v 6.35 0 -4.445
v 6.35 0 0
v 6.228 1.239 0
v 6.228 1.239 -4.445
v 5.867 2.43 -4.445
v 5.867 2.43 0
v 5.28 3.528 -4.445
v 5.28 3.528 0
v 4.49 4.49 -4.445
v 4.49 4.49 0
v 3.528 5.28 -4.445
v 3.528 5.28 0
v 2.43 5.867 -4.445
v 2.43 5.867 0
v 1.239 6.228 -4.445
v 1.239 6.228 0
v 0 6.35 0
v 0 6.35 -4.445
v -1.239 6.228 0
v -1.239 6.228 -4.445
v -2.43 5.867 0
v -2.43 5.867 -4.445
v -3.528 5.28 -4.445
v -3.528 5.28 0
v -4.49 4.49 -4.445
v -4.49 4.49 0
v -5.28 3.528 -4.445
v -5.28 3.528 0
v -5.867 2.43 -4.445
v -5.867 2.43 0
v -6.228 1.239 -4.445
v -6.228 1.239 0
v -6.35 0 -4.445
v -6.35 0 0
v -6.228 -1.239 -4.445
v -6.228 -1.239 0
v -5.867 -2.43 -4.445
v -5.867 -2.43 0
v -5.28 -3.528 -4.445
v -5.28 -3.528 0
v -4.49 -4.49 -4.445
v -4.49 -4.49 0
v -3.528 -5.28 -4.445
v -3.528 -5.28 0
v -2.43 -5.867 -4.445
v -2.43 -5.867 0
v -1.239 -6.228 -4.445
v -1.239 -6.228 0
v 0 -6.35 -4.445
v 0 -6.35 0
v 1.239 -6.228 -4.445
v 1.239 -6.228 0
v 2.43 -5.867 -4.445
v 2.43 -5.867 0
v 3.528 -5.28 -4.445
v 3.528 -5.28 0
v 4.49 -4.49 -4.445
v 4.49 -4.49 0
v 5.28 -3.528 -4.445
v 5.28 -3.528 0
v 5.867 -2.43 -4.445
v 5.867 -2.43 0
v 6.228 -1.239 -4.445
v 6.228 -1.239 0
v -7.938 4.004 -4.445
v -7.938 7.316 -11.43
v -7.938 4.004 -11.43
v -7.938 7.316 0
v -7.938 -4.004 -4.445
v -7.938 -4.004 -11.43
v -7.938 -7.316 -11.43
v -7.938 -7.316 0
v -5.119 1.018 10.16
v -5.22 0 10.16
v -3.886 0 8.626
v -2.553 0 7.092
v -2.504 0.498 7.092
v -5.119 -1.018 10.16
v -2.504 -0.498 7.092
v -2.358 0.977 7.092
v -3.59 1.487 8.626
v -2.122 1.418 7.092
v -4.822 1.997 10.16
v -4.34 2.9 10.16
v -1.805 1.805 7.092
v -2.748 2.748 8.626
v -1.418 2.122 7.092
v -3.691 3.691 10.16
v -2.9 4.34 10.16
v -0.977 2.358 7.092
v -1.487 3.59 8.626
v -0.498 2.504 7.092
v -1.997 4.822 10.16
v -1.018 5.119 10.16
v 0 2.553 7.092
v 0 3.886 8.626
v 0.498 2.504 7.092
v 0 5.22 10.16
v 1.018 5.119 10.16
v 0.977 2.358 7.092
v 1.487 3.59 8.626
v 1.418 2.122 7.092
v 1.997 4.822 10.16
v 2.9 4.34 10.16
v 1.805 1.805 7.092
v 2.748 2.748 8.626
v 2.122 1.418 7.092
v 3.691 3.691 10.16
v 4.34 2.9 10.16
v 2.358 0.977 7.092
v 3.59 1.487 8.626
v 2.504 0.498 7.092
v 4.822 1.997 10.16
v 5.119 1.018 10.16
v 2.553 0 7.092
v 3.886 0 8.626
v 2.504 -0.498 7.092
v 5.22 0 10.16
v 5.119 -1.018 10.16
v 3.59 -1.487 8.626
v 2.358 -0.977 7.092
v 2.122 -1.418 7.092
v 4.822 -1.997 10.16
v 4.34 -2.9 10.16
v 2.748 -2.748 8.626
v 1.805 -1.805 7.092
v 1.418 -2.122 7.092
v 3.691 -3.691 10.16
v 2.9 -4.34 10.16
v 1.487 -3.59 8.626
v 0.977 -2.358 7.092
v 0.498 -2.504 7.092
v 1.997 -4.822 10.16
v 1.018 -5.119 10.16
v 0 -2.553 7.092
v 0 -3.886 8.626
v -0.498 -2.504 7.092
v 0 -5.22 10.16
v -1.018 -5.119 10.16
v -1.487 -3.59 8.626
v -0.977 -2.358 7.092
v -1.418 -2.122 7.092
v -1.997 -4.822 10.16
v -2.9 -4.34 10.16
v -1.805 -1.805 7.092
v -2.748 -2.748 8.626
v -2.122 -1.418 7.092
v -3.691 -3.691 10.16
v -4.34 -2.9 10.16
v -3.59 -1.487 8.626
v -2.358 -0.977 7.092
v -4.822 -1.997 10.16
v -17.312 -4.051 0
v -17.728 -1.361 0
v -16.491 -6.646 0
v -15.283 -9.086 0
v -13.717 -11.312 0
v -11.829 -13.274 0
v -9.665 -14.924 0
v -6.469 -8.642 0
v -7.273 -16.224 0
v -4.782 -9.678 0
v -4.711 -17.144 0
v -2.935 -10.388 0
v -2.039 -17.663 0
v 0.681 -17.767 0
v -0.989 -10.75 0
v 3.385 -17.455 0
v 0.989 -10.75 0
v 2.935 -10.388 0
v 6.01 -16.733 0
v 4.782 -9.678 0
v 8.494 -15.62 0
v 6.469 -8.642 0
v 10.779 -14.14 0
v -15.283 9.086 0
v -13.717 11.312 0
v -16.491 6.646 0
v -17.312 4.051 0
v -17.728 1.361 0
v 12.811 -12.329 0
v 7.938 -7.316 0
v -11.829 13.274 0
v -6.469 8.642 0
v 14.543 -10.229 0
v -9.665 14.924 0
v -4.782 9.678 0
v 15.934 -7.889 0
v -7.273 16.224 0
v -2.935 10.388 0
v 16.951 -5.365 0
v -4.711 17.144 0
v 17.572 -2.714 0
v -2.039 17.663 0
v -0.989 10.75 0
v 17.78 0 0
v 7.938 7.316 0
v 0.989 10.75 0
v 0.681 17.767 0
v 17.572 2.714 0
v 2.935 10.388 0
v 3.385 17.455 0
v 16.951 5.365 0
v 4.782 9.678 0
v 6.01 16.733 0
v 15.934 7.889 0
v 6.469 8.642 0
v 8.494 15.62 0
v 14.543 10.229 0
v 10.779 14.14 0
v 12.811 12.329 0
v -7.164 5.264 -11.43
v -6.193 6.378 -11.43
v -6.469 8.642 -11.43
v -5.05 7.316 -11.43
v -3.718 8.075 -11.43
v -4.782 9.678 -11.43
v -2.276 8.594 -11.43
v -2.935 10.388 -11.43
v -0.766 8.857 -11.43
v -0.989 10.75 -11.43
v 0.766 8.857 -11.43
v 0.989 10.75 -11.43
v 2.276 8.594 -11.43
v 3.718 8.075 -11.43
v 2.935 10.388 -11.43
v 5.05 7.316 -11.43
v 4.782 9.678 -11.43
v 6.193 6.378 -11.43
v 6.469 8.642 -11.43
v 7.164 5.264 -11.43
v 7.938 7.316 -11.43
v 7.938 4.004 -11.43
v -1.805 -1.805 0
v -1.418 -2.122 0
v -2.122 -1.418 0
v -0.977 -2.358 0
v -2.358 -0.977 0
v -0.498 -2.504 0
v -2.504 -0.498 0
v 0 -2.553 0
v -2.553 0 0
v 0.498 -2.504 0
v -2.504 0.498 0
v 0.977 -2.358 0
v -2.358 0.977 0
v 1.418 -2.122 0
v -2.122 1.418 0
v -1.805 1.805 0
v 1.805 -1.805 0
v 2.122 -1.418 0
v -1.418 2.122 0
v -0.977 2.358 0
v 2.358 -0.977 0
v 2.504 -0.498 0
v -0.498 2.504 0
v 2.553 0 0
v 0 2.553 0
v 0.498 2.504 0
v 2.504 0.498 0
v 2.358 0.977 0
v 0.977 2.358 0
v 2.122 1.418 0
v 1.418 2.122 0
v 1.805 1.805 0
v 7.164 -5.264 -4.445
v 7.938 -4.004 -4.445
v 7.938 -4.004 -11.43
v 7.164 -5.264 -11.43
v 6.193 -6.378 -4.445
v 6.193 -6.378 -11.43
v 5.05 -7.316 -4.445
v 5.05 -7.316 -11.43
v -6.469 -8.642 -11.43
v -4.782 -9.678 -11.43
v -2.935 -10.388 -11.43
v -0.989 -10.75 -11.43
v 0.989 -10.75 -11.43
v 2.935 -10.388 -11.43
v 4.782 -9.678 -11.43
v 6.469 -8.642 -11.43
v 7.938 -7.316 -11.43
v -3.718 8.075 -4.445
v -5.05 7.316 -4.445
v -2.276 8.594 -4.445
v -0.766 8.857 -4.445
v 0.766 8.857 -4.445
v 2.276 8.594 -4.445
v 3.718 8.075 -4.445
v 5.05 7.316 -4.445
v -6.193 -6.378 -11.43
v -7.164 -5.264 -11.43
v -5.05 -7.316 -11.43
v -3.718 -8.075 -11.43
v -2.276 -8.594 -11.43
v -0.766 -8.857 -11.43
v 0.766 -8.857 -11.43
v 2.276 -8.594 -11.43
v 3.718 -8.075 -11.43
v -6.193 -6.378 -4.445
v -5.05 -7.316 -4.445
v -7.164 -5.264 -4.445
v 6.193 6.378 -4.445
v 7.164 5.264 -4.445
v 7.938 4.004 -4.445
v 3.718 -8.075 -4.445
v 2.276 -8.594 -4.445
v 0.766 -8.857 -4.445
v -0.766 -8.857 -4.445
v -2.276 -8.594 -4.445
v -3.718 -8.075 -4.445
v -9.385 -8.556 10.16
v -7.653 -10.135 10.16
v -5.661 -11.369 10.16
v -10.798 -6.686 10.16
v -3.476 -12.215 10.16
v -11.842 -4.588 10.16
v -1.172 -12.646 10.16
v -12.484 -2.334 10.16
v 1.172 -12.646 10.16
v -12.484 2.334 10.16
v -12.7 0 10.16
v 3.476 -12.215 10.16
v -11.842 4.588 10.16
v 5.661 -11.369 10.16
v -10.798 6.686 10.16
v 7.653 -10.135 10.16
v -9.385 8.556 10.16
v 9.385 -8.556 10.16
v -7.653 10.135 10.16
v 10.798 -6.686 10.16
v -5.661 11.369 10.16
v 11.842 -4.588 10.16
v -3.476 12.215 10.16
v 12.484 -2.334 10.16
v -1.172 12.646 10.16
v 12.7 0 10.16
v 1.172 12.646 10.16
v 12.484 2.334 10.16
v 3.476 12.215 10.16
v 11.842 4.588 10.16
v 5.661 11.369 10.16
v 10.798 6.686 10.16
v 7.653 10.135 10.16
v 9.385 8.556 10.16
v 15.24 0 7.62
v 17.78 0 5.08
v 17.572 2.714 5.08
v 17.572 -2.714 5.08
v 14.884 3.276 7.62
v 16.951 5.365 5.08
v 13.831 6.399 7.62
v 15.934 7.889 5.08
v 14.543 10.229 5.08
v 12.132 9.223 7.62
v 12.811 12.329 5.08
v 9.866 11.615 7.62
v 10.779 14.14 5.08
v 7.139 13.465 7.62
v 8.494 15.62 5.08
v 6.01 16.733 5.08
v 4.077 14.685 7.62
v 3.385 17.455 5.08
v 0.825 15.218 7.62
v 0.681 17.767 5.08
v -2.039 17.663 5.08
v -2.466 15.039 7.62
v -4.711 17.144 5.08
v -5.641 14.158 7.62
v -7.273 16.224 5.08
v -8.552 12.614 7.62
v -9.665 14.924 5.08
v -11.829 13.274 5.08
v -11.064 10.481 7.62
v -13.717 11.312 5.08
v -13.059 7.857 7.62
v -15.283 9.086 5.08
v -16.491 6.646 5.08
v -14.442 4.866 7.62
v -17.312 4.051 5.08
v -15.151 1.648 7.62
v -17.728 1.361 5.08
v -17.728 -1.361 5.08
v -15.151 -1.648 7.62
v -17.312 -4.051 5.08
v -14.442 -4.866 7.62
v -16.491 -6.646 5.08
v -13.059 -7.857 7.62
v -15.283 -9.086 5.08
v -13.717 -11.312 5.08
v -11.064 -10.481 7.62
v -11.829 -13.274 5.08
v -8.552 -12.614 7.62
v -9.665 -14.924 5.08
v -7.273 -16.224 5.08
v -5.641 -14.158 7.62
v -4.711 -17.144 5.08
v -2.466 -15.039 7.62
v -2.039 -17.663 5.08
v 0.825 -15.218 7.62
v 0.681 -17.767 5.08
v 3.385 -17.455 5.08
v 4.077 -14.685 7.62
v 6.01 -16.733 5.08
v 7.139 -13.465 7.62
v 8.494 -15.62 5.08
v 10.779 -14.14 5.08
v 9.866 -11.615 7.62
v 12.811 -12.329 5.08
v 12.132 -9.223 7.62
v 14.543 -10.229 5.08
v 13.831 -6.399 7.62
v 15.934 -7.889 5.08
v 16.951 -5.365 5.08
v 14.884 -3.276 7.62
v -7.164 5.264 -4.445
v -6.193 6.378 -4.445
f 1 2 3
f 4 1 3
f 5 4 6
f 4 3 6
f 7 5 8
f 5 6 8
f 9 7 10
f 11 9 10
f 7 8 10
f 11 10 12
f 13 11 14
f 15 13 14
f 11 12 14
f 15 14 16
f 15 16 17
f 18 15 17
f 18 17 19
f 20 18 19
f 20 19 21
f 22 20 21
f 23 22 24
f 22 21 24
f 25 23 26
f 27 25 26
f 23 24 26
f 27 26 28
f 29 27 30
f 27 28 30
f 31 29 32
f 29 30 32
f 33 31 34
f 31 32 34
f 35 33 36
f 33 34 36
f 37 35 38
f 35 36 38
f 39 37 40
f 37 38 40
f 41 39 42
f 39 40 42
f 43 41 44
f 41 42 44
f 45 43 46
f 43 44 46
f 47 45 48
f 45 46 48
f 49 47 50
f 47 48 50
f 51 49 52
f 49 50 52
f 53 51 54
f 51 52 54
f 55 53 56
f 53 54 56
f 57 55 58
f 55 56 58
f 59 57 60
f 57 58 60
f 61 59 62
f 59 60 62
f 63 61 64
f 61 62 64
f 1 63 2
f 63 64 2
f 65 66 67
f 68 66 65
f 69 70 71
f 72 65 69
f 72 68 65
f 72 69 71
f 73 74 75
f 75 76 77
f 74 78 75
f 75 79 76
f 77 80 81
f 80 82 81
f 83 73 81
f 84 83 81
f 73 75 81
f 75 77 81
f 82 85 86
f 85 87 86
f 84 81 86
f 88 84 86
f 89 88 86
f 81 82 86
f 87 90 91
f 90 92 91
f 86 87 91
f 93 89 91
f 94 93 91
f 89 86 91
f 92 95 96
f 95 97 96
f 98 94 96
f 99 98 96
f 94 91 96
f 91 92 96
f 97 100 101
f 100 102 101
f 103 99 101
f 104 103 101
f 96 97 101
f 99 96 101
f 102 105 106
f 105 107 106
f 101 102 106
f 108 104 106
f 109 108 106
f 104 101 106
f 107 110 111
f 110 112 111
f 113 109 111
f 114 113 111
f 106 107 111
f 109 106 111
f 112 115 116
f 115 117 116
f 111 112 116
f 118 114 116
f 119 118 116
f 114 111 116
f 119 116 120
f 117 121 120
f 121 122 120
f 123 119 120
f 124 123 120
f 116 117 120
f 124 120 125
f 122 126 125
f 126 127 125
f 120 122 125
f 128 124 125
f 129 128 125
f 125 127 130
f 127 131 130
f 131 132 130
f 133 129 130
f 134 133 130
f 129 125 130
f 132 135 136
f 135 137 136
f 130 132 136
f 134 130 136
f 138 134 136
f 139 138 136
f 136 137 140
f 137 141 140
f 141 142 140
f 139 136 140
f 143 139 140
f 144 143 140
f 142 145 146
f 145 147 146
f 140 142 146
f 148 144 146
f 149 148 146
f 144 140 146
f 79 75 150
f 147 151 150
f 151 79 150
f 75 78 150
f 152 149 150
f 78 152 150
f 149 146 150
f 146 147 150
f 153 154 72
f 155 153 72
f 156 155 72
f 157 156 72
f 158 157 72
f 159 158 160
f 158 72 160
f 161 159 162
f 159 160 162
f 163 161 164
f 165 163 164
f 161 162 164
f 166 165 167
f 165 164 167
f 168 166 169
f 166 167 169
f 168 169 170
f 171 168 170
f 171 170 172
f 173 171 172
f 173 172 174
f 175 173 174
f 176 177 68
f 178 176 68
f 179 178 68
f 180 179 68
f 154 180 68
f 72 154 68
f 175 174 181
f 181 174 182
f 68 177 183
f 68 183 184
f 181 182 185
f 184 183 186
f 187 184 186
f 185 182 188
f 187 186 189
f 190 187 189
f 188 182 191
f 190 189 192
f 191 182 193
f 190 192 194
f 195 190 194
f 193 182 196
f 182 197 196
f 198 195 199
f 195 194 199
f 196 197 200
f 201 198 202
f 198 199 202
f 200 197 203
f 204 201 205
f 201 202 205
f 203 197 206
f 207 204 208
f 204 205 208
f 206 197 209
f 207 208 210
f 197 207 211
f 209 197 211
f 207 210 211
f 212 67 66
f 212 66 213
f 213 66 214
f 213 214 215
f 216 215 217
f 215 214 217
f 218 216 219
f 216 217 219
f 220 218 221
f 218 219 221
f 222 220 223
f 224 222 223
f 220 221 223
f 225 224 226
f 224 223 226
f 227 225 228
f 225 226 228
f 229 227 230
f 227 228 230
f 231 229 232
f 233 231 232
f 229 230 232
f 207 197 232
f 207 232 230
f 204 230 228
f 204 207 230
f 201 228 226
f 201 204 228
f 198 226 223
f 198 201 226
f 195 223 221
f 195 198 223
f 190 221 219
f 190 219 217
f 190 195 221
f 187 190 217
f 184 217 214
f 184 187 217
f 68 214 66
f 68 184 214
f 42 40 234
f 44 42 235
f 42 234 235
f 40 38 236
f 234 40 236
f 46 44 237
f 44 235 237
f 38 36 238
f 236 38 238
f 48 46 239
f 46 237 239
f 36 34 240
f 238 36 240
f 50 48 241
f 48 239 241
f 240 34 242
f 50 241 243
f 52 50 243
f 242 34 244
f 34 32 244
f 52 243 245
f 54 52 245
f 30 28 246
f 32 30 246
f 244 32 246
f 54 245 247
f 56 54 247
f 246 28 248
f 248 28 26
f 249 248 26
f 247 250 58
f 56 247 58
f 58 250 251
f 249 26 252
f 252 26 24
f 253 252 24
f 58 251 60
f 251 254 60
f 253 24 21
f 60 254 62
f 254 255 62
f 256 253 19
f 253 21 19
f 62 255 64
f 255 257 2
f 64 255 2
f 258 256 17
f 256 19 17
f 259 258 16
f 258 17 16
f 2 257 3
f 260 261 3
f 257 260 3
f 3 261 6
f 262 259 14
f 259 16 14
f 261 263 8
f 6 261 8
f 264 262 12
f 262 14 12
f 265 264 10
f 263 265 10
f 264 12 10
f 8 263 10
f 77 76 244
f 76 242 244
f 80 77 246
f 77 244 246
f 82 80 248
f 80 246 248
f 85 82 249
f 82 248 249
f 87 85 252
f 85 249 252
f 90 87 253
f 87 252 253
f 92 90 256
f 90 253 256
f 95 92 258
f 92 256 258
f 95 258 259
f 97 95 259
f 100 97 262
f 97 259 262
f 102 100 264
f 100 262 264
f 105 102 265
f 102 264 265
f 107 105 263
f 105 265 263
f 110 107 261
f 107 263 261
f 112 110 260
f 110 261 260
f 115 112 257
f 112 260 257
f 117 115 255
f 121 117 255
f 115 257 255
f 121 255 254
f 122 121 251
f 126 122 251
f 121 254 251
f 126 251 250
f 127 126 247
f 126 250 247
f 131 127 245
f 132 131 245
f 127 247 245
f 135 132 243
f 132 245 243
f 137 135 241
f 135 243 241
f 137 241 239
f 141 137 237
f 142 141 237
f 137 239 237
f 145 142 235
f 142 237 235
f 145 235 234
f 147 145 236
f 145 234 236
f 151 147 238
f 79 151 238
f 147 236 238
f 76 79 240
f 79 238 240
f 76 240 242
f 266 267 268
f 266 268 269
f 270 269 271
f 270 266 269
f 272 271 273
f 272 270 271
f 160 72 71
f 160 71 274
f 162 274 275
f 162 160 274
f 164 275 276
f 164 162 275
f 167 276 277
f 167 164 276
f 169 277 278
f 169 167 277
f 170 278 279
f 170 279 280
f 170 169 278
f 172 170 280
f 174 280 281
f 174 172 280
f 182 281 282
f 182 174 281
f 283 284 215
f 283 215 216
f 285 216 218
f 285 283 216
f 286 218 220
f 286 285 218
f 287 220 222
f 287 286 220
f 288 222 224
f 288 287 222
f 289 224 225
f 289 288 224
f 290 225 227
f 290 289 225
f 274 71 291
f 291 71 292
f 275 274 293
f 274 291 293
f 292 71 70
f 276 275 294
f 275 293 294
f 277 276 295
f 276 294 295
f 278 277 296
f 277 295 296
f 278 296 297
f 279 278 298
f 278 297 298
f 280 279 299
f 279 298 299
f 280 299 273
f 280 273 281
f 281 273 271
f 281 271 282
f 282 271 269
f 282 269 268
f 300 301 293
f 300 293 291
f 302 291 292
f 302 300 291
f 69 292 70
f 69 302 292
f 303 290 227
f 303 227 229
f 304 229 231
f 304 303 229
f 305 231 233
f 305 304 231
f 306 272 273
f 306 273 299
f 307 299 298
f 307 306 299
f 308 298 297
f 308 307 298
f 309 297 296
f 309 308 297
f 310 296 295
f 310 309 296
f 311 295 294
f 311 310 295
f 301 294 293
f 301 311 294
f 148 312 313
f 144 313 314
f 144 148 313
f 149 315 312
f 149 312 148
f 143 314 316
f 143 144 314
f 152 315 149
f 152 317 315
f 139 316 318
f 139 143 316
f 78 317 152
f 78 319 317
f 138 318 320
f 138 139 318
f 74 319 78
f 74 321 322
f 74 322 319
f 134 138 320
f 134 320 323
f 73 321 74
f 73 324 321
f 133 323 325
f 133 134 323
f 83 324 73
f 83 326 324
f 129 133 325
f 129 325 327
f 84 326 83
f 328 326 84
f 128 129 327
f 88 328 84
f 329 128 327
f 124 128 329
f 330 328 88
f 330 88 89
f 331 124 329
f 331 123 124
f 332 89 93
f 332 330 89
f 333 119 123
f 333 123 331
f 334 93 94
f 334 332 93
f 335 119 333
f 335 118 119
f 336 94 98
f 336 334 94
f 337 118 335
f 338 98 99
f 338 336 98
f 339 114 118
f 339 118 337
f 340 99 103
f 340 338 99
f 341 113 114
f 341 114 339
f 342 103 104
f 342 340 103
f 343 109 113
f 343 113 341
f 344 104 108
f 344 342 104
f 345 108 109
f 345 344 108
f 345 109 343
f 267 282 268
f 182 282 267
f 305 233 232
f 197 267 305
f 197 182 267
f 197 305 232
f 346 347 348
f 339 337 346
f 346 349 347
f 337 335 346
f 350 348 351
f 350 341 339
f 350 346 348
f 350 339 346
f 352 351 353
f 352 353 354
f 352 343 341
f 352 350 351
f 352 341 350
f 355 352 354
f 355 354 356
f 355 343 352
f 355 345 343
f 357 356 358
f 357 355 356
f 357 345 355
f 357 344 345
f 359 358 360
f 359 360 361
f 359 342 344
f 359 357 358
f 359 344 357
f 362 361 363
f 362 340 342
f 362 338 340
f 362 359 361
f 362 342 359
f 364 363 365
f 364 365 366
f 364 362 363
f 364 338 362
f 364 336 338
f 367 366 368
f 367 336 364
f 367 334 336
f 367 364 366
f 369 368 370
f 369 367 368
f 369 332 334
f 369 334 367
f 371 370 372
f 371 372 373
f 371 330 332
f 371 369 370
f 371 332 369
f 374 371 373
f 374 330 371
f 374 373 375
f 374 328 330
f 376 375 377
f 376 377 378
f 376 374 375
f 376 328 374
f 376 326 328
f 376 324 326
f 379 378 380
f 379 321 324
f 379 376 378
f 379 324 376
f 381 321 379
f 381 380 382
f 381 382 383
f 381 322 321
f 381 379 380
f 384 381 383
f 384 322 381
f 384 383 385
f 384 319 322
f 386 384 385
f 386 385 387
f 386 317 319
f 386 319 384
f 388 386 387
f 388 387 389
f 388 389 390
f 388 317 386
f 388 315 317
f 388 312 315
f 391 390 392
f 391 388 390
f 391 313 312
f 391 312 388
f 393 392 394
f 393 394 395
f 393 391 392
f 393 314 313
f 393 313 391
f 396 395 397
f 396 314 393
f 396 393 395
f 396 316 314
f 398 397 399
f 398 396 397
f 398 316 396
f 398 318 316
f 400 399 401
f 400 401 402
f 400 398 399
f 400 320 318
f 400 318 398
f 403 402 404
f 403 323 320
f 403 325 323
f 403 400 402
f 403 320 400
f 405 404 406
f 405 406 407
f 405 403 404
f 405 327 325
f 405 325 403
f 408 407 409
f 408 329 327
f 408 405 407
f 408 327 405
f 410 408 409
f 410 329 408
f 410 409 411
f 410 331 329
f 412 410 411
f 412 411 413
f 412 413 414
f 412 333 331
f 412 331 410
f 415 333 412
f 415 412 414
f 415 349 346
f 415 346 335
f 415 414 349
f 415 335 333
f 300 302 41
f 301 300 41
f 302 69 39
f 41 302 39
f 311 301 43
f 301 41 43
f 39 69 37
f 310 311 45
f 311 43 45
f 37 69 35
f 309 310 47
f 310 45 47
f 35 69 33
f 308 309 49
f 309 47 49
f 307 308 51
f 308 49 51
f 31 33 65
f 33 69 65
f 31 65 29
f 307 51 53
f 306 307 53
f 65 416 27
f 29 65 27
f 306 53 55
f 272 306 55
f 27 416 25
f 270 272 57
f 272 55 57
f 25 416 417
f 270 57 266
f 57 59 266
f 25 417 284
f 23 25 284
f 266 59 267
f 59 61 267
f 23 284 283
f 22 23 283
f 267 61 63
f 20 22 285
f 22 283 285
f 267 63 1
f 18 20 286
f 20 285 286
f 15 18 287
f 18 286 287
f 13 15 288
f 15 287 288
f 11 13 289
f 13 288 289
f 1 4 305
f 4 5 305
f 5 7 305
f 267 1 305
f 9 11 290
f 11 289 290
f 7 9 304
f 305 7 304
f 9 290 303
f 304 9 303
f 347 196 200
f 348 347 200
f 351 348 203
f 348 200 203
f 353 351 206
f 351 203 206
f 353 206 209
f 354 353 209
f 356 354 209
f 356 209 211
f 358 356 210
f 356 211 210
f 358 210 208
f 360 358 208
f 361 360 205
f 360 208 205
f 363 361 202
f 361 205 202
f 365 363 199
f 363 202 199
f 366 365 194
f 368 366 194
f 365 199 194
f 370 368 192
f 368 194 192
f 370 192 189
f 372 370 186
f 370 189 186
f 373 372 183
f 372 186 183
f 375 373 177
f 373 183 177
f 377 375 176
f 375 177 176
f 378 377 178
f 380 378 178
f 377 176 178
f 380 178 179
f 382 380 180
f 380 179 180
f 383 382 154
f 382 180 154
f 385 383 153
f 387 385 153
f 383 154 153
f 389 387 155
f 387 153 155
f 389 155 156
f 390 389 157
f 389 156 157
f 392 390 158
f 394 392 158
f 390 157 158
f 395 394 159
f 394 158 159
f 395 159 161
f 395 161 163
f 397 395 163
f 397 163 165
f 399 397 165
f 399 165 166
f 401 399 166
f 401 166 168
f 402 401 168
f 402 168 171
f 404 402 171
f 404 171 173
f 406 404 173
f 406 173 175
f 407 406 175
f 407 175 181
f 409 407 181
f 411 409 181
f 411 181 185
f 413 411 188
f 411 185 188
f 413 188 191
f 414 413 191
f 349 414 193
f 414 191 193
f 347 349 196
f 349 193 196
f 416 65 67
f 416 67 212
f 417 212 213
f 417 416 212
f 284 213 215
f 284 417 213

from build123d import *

# Parameters (mm, degrees)
F0_R           = 17.78
F1_DEPTH       = 10.16
F3_D           = 5.1054
F3_CSINK_D     = 10.4394
F3_CSINK_ANGLE = 82
F5_DEPTH       = 11.43
F4_R           = 6.35
F6_DEPTH       = 4.445
F7_SIZE        = 5.08


with BuildPart() as f1:
    # F0 (on Top) → F1 (new body)
    with BuildSketch(Plane.XY):
        Circle(F0_R)
    extrude(amount=F1_DEPTH)

    # F3 (through all)
    with Locations(Plane.XY.offset(10.16)):
        with Locations((0, 0)):
            CounterSinkHole(F3_D / 2, F3_CSINK_D / 2, counter_sink_angle=F3_CSINK_ANGLE)

    # F4 (on Top) → F5 (join)
    with BuildSketch(Plane.XY):
        with BuildLine():
            Line((5.0501466563, 7.3162913248), (7.9375, 7.3162913248))
            ThreePointArc((7.9375, 7.3162913248), (0, 10.795), (-7.9375, 7.3162913248))
            Line((-7.9375, 7.3162913248), (-5.0501466563, 7.3162913248))
            ThreePointArc((-5.0501466563, 7.3162913248), (0, 8.89), (5.0501466563, 7.3162913248))
        make_face()
        with BuildLine():
            Line((7.9375, 4.0035226676), (7.9375, 7.3162913248))
            Line((7.9375, 7.3162913248), (5.0501466563, 7.3162913248))
            ThreePointArc((5.0501466563, 7.3162913248), (6.7017423452, 5.8411257082), (7.9375, 4.0035226676))
        make_face()
        with BuildLine():
            Line((-5.0501466563, 7.3162913248), (-7.9375, 7.3162913248))
            Line((-7.9375, 7.3162913248), (-7.9375, 4.0035226676))
            ThreePointArc((-7.9375, 4.0035226676), (-6.7017423452, 5.8411257082), (-5.0501466563, 7.3162913248))
        make_face()
        with BuildLine():
            Line((-7.9375, -4.0035226676), (-7.9375, -7.3162913248))
            Line((-7.9375, -7.3162913248), (-5.0501466563, -7.3162913248))
            ThreePointArc((-5.0501466563, -7.3162913248), (-6.7017423452, -5.8411257082), (-7.9375, -4.0035226676))
        make_face()
        with BuildLine():
            ThreePointArc((-7.9375, -7.3162913248), (0, -10.795), (7.9375, -7.3162913248))
            Line((7.9375, -7.3162913248), (5.0501466563, -7.3162913248))
            ThreePointArc((5.0501466563, -7.3162913248), (0, -8.89), (-5.0501466563, -7.3162913248))
            Line((-5.0501466563, -7.3162913248), (-7.9375, -7.3162913248))
        make_face()
        with BuildLine():
            Line((5.0501466563, -7.3162913248), (7.9375, -7.3162913248))
            Line((7.9375, -7.3162913248), (7.9375, -4.0035226676))
            ThreePointArc((7.9375, -4.0035226676), (6.7017423452, -5.8411257082), (5.0501466563, -7.3162913248))
        make_face()
    extrude(amount=-F5_DEPTH)

    # F4 (on Top) → F6 (join)
    with BuildSketch(Plane.XY):
        with BuildLine():
            ThreePointArc((7.9375, 4.0035226676), (6.7017423452, 5.8411257082), (5.0501466563, 7.3162913248))
            Line((5.0501466563, 7.3162913248), (-5.0501466563, 7.3162913248))
            ThreePointArc((-5.0501466563, 7.3162913248), (-6.7017423452, 5.8411257082), (-7.9375, 4.0035226676))
            Line((-7.9375, 4.0035226676), (-7.9375, -4.0035226676))
            ThreePointArc((-7.9375, -4.0035226676), (-6.7017423452, -5.8411257082), (-5.0501466563, -7.3162913248))
            Line((-5.0501466563, -7.3162913248), (5.0501466563, -7.3162913248))
            ThreePointArc((5.0501466563, -7.3162913248), (6.7017423452, -5.8411257082), (7.9375, -4.0035226676))
            Line((7.9375, -4.0035226676), (7.9375, 4.0035226676))
        make_face()
        Circle(F4_R, mode=Mode.SUBTRACT)
        with BuildLine():
            ThreePointArc((-5.0501466563, -7.3162913248), (0, -8.89), (5.0501466563, -7.3162913248))
            Line((5.0501466563, -7.3162913248), (-5.0501466563, -7.3162913248))
        make_face()
        with BuildLine():
            Line((-5.0501466563, 7.3162913248), (5.0501466563, 7.3162913248))
            ThreePointArc((5.0501466563, 7.3162913248), (0, 8.89), (-5.0501466563, 7.3162913248))
        make_face()
    extrude(amount=-F6_DEPTH)

    # F7
    f7_edges = [f1.edges().sort_by_distance(p)[0] for p in [
        (-17.78, 0, 10.16),
    ]]
    chamfer(f7_edges, length=F7_SIZE)


solid = f1.part
